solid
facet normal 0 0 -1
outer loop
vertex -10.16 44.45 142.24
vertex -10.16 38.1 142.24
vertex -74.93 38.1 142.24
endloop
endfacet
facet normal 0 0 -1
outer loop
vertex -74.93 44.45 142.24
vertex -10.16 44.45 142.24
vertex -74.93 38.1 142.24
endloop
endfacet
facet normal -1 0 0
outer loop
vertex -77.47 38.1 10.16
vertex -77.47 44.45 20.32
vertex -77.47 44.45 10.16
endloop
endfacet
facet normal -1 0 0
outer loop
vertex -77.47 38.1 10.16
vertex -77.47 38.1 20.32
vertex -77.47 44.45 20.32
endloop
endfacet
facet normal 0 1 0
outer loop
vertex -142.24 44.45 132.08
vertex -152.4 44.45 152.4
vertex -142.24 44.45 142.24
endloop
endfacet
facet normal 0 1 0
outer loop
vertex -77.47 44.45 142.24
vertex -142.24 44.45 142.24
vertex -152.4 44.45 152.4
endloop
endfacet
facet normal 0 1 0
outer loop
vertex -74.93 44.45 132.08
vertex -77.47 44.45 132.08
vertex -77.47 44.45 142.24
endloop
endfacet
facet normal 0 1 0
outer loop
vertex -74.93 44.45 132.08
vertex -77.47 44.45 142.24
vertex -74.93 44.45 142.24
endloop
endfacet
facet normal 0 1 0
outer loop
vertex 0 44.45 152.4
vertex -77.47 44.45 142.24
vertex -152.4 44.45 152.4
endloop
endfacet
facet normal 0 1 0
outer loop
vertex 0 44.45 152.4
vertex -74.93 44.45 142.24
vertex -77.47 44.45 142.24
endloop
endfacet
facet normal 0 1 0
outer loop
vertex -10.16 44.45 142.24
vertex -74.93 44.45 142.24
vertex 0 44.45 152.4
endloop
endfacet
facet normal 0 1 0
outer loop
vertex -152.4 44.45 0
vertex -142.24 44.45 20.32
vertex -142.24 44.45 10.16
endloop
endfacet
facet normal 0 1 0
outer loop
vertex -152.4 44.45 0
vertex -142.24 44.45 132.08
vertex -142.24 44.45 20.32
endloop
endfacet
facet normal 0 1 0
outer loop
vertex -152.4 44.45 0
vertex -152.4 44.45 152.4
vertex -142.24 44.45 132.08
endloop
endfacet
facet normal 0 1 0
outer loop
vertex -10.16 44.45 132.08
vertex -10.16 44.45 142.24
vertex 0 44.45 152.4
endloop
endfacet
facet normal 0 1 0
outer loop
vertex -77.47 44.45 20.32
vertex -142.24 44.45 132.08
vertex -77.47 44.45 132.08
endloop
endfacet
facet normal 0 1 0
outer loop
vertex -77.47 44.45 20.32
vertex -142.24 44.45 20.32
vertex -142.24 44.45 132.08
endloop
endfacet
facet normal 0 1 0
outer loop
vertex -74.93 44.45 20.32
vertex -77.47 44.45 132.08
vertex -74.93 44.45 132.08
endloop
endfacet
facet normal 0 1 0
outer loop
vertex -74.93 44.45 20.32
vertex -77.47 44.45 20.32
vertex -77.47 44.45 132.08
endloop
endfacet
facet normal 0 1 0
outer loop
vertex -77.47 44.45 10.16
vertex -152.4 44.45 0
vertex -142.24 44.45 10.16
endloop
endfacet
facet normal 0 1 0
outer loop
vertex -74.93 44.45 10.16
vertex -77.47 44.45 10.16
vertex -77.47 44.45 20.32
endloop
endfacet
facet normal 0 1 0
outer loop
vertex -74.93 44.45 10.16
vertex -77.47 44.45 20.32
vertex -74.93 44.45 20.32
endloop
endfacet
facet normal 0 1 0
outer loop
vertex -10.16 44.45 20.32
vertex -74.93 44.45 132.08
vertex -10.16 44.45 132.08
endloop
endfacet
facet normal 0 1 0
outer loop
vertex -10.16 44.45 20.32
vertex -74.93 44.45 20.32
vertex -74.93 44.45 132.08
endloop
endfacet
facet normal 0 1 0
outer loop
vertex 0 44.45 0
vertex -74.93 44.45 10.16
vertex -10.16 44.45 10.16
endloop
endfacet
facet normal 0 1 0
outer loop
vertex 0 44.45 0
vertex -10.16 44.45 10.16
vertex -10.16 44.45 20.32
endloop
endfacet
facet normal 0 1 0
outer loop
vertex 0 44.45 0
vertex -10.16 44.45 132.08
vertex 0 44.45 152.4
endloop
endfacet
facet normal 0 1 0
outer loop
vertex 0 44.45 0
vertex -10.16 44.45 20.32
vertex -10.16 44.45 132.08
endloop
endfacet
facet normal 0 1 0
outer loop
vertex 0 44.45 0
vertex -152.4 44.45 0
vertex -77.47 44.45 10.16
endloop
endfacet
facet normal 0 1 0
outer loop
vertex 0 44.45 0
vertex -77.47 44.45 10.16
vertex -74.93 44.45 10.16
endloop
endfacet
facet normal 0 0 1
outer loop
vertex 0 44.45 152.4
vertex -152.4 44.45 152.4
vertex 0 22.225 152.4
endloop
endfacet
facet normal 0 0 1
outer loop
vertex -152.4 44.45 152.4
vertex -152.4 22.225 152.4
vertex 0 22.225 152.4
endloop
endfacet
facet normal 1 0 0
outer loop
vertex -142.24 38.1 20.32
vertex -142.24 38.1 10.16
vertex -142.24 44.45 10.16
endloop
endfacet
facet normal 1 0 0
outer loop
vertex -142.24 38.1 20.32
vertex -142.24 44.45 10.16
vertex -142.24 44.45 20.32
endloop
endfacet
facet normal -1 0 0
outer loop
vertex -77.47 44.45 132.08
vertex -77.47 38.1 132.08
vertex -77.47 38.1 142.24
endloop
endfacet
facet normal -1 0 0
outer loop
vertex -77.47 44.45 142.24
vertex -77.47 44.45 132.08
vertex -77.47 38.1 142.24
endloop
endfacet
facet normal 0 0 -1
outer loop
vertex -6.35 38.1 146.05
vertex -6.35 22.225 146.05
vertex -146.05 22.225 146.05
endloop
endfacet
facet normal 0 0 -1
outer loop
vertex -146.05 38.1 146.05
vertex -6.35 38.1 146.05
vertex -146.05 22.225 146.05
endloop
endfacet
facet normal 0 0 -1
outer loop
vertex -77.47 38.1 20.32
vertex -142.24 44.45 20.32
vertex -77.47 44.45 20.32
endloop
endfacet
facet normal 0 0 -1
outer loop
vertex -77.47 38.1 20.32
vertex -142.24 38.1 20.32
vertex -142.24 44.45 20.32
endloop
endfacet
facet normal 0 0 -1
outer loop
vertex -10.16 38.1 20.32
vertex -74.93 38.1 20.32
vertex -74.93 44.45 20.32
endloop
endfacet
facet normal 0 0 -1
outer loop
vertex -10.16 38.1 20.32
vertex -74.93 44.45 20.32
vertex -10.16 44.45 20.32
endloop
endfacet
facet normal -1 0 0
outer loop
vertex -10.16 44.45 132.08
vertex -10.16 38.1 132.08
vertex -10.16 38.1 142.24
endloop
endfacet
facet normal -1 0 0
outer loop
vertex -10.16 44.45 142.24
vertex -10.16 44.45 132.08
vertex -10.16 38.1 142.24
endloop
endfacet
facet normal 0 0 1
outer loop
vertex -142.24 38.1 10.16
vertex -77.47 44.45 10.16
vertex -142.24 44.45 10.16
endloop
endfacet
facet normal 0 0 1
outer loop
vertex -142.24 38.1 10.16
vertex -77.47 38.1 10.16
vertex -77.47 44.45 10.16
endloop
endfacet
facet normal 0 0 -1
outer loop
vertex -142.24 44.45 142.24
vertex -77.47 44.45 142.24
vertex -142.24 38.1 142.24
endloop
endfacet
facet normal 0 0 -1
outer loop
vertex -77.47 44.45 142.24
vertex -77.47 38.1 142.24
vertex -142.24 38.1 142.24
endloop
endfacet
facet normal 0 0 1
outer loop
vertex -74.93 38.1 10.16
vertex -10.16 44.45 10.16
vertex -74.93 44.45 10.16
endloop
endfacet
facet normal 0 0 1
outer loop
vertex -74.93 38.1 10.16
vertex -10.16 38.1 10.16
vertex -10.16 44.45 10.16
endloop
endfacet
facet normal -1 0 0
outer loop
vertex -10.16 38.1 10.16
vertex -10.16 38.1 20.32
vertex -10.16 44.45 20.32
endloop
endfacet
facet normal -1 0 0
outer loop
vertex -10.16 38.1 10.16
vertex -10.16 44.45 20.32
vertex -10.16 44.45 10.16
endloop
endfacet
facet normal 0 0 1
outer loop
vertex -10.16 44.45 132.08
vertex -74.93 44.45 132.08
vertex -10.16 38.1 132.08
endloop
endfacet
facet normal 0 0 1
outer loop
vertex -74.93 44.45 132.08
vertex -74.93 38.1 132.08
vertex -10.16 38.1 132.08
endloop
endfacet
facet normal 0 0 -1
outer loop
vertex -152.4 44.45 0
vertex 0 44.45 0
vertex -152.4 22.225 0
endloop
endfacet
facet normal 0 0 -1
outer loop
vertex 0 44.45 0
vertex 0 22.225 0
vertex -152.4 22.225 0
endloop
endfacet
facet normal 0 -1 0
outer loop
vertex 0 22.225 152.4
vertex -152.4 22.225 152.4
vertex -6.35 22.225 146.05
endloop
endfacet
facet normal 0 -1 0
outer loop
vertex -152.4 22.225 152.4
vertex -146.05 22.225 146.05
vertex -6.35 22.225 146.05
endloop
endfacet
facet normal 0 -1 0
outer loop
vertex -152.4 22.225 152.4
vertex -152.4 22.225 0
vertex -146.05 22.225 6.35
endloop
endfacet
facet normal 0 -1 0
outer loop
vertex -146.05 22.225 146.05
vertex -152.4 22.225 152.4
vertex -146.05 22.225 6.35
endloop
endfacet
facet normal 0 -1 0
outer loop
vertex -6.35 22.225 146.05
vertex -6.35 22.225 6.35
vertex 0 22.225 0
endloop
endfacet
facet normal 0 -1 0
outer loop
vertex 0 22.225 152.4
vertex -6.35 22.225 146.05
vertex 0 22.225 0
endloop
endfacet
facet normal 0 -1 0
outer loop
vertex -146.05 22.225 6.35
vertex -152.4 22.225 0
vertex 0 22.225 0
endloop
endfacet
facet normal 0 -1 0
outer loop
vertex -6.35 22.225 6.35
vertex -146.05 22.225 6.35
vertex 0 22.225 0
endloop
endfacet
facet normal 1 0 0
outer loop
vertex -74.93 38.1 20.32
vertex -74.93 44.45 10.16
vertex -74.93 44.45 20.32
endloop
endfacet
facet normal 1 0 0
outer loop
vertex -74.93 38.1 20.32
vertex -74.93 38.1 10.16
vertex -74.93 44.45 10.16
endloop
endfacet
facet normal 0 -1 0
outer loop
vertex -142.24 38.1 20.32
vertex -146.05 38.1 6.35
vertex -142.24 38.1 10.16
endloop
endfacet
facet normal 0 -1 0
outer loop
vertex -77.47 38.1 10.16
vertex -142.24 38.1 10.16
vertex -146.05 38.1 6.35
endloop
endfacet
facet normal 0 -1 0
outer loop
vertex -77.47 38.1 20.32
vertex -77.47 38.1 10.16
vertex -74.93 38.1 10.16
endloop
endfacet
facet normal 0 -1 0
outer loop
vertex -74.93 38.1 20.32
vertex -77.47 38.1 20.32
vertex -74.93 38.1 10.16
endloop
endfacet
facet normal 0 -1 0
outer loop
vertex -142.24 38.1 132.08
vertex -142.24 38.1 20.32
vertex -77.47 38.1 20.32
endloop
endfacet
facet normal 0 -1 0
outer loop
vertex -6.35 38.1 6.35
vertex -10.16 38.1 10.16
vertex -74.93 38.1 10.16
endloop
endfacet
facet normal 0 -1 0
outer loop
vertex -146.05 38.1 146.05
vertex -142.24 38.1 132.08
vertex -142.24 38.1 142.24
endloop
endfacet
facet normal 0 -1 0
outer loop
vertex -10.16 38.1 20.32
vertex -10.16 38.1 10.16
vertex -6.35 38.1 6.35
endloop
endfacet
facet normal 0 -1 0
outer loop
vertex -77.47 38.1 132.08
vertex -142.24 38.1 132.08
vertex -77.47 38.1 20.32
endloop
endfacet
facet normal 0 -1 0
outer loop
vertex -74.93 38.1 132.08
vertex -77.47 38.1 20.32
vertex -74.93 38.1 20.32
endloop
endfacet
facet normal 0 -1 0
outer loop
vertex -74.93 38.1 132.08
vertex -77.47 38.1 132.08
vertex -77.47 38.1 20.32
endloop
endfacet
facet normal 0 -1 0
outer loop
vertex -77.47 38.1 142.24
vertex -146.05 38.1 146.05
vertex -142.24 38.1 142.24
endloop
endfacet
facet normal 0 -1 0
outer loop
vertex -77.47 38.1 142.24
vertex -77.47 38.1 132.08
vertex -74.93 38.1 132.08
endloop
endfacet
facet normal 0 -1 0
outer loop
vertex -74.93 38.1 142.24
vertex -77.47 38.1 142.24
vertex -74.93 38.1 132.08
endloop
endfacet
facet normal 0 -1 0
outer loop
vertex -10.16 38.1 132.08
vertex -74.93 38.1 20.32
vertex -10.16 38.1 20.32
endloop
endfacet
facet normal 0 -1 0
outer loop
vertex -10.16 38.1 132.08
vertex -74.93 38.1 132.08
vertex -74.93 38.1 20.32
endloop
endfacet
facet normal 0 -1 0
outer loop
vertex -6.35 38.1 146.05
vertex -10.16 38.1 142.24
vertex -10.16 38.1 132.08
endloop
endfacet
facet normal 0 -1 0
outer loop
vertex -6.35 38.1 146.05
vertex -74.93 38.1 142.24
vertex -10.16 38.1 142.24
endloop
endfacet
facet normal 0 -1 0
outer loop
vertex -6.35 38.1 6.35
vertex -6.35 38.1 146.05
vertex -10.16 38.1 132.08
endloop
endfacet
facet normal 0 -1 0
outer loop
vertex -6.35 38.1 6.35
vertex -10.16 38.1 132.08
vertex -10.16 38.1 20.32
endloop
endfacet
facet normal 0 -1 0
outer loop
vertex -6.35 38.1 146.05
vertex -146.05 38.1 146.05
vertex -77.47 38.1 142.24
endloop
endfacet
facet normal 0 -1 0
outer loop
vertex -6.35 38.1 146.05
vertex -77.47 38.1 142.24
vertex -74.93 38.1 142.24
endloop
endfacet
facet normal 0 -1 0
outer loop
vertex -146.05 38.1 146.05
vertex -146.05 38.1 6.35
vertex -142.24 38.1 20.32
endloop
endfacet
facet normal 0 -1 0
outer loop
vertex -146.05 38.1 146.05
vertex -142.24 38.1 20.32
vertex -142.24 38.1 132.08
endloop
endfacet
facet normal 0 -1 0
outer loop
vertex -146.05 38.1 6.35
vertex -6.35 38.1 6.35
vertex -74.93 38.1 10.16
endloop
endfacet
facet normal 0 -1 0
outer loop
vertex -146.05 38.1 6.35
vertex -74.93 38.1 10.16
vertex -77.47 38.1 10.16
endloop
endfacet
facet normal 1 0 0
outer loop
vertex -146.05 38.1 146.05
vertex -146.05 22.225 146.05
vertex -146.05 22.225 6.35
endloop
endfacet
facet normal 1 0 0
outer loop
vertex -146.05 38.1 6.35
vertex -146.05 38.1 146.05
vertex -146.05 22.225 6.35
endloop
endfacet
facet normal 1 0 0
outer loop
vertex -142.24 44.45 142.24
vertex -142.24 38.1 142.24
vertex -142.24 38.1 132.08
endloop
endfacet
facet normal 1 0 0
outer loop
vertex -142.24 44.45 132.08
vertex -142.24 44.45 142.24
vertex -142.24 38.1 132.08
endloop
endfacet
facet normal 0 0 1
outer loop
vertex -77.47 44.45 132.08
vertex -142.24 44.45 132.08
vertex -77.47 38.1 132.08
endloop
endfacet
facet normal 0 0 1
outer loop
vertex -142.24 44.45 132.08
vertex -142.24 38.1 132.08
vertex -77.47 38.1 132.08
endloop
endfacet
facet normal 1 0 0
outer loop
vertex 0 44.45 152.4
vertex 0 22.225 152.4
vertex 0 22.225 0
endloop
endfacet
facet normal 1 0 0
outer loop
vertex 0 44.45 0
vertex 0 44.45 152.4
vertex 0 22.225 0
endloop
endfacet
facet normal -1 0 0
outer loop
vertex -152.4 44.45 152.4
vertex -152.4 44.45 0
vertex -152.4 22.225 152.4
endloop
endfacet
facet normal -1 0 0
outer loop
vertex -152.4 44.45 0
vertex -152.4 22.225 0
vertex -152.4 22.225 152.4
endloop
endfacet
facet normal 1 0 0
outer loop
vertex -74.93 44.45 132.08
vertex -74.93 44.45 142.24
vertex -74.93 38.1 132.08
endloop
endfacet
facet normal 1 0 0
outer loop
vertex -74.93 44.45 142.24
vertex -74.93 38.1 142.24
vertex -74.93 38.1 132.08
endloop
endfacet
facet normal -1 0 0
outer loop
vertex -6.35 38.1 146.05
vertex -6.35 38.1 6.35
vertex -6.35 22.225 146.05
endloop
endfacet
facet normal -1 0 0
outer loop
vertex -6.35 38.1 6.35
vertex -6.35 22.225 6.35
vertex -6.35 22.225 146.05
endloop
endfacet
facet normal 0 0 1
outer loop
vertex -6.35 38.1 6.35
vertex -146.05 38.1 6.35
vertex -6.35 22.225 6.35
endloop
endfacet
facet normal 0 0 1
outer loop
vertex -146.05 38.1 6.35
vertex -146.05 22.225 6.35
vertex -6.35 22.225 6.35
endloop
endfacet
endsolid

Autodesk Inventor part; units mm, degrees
ref_plane "YZ Plane" through (0, 0, 0) normal (1, 0, 0) x (0, 1, 0)
ref_plane "XZ Plane" through (0, 0, 0) normal (0, 1, 0) x (-1, 0, 0)
ref_plane "XY Plane" through (0, 0, 0) normal (0, 0, 1) x (1, 0, 0)
sketch "Sketch1" plane through (0, 0, 0) normal (0, 1, 0) x (-1, 0, 0)
  line L0 (0, 0) -> (152.4, 0)
  line L1 (152.4, 0) -> (152.4, 152.4)
  line L2 (152.4, 152.4) -> (0, 152.4)
  line L3 (0, 152.4) -> (0, 0)
  dimension "d0" = 152.4
  dimension "d1" = 152.4
extrude "Extrusion1" add sketch "Sketch1" along normal blind 6.35
sketch "Sketch2" plane through (0, 6.35, 0) normal (0, 1, 0) x (1, 0, 0)
  line L0 (-142.24, -142.24) -> (-77.47, -142.24)
  line L1 (-77.47, -142.24) -> (-77.47, -132.08)
  line L2 (-77.47, -132.08) -> (-142.24, -132.08)
  line L3 (-142.24, -132.08) -> (-142.24, -142.24)
  line L4 (-74.93, -142.24) -> (-10.16, -142.24)
  line L5 (-10.16, -142.24) -> (-10.16, -132.08)
  line L6 (-10.16, -132.08) -> (-74.93, -132.08)
  line L7 (-74.93, -132.08) -> (-74.93, -142.24)
  line L8 (-152.4, 0) -> (-152.4, -152.4) projected
  line L9 (-152.4, -152.4) -> (0, -152.4) projected
  line L10 (0, -152.4) -> (0, 0) projected
  line L11 (-152.4, -76.2) -> (0, -76.2) construction
  line L12 (-142.24, -10.16) -> (-77.47, -10.16)
  line L13 (-77.47, -10.16) -> (-77.47, -20.32)
  line L14 (-77.47, -20.32) -> (-142.24, -20.32)
  line L15 (-142.24, -20.32) -> (-142.24, -10.16)
  line L16 (-74.93, -10.16) -> (-10.16, -10.16)
  line L17 (-10.16, -10.16) -> (-10.16, -20.32)
  line L18 (-10.16, -20.32) -> (-74.93, -20.32)
  line L19 (-74.93, -20.32) -> (-74.93, -10.16)
  point P0 (-10.16, -137.16)
  point P1 (-10.16, -15.24)
  dimension "d4" = 10.16
  dimension "d5" = 10.16
  dimension "d6" = 10.16
  dimension "d7" = 64.77
  dimension "d8" = 64.77
  dimension "d9" = 10.16
  dimension "d10" = 10.16
  dimension "d11" = 10.16
extrude "Extrusion2" cut sketch "Sketch2" against normal through all
sketch "Sketch3" plane through (0, 6.35, 0) normal (0, 1, 0) x (1, 0, 0)
  line L0 (-77.47, -20.32) -> (-142.24, -20.32) projected
  line L1 (-142.24, -20.32) -> (-142.24, -10.16) projected
  line L2 (-142.24, -10.16) -> (-77.47, -10.16) projected
  line L3 (-77.47, -10.16) -> (-77.47, -20.32) projected
  line L4 (-74.93, -132.08) -> (-10.16, -132.08) projected
  line L5 (-10.16, -132.08) -> (-10.16, -142.24) projected
  line L6 (-10.16, -142.24) -> (-74.93, -142.24) projected
  line L7 (-74.93, -142.24) -> (-74.93, -132.08) projected
  line L8 (-10.16, -10.16) -> (-10.16, -20.32) projected
  line L9 (-10.16, -20.32) -> (-74.93, -20.32) projected
  line L10 (-74.93, -20.32) -> (-74.93, -10.16) projected
  line L11 (-74.93, -10.16) -> (-10.16, -10.16) projected
  line L12 (-142.24, -132.08) -> (-77.47, -132.08) projected
  line L13 (-77.47, -132.08) -> (-77.47, -142.24) projected
  line L14 (-77.47, -142.24) -> (-142.24, -142.24) projected
  line L15 (-142.24, -142.24) -> (-142.24, -132.08) projected
  line L16 (-152.4, 0) -> (-152.4, -152.4) projected
  line L17 (-152.4, -152.4) -> (0, -152.4) projected
  line L18 (0, -152.4) -> (0, 0) projected
  line L19 (0, 0) -> (-152.4, 0) projected
  line L20 (-146.05, -146.05) -> (-146.05, -6.35)
  line L21 (-146.05, -6.35) -> (-6.35, -6.35)
  line L22 (-6.35, -6.35) -> (-6.35, -146.05)
  line L23 (-6.35, -146.05) -> (-146.05, -146.05)
  dimension "d14" = 6.35
extrude "Extrusion3" add sketch "Sketch3" along normal blind 38.1 contours L19 L18 L17 L16
ref_plane "Work Plane1" through (0, 22.225, 0) normal (0, 1, 0) x (1, 0, 0)
mirror "Mirror1" about plane through (0, 22.225, 0) normal (0, 1, 0) of "Extrusion1", "Extrusion2"
sketch "Sketch5" plane through (0, 22.225, 0) normal (0, 1, 0) x (1, 0, 0)
  line L0 (-142.24, -10.16) -> (-77.47, -10.16) projected
  line L1 (-77.47, -10.16) -> (-77.47, -20.32) projected
  line L2 (-77.47, -20.32) -> (-142.24, -20.32) projected
  line L3 (-142.24, -20.32) -> (-142.24, -10.16) projected
  line L4 (-142.24, -142.24) -> (-142.24, -132.08) projected
  line L5 (-142.24, -132.08) -> (-77.47, -132.08) projected
  line L6 (-77.47, -132.08) -> (-77.47, -142.24) projected
  line L7 (-77.47, -142.24) -> (-142.24, -142.24) projected
  line L8 (-74.93, -20.32) -> (-74.93, -10.16) projected
  line L9 (-74.93, -10.16) -> (-10.16, -10.16) projected
  line L10 (-10.16, -10.16) -> (-10.16, -20.32) projected
  line L11 (-10.16, -20.32) -> (-74.93, -20.32) projected
  line L12 (-74.93, -142.24) -> (-74.93, -132.08) projected
  line L13 (-74.93, -132.08) -> (-10.16, -132.08) projected
  line L14 (-10.16, -132.08) -> (-10.16, -142.24) projected
  line L15 (-10.16, -142.24) -> (-74.93, -142.24) projected
  line L16 (-152.4, -152.4) -> (0, -152.4) projected
  line L17 (0, -152.4) -> (0, 0) projected
  line L18 (0, 0) -> (-152.4, 0) projected
  line L19 (-152.4, 0) -> (-152.4, -152.4) projected
extrude "Extrusion4" cut sketch "Sketch5" against normal through all contours L0 L1 L2 L3 | L4 L5 L6 L7 | L8 L9 L10 L11 | L12 L13 L14 L15 | L19 L18 L17 L16
equation "\"d8\" = d7"
equation "\"d9\" = d4"
equation "\"d10\" = d5"
equation "\"d11\" = d6"
properties part number "Bot v1 top"
